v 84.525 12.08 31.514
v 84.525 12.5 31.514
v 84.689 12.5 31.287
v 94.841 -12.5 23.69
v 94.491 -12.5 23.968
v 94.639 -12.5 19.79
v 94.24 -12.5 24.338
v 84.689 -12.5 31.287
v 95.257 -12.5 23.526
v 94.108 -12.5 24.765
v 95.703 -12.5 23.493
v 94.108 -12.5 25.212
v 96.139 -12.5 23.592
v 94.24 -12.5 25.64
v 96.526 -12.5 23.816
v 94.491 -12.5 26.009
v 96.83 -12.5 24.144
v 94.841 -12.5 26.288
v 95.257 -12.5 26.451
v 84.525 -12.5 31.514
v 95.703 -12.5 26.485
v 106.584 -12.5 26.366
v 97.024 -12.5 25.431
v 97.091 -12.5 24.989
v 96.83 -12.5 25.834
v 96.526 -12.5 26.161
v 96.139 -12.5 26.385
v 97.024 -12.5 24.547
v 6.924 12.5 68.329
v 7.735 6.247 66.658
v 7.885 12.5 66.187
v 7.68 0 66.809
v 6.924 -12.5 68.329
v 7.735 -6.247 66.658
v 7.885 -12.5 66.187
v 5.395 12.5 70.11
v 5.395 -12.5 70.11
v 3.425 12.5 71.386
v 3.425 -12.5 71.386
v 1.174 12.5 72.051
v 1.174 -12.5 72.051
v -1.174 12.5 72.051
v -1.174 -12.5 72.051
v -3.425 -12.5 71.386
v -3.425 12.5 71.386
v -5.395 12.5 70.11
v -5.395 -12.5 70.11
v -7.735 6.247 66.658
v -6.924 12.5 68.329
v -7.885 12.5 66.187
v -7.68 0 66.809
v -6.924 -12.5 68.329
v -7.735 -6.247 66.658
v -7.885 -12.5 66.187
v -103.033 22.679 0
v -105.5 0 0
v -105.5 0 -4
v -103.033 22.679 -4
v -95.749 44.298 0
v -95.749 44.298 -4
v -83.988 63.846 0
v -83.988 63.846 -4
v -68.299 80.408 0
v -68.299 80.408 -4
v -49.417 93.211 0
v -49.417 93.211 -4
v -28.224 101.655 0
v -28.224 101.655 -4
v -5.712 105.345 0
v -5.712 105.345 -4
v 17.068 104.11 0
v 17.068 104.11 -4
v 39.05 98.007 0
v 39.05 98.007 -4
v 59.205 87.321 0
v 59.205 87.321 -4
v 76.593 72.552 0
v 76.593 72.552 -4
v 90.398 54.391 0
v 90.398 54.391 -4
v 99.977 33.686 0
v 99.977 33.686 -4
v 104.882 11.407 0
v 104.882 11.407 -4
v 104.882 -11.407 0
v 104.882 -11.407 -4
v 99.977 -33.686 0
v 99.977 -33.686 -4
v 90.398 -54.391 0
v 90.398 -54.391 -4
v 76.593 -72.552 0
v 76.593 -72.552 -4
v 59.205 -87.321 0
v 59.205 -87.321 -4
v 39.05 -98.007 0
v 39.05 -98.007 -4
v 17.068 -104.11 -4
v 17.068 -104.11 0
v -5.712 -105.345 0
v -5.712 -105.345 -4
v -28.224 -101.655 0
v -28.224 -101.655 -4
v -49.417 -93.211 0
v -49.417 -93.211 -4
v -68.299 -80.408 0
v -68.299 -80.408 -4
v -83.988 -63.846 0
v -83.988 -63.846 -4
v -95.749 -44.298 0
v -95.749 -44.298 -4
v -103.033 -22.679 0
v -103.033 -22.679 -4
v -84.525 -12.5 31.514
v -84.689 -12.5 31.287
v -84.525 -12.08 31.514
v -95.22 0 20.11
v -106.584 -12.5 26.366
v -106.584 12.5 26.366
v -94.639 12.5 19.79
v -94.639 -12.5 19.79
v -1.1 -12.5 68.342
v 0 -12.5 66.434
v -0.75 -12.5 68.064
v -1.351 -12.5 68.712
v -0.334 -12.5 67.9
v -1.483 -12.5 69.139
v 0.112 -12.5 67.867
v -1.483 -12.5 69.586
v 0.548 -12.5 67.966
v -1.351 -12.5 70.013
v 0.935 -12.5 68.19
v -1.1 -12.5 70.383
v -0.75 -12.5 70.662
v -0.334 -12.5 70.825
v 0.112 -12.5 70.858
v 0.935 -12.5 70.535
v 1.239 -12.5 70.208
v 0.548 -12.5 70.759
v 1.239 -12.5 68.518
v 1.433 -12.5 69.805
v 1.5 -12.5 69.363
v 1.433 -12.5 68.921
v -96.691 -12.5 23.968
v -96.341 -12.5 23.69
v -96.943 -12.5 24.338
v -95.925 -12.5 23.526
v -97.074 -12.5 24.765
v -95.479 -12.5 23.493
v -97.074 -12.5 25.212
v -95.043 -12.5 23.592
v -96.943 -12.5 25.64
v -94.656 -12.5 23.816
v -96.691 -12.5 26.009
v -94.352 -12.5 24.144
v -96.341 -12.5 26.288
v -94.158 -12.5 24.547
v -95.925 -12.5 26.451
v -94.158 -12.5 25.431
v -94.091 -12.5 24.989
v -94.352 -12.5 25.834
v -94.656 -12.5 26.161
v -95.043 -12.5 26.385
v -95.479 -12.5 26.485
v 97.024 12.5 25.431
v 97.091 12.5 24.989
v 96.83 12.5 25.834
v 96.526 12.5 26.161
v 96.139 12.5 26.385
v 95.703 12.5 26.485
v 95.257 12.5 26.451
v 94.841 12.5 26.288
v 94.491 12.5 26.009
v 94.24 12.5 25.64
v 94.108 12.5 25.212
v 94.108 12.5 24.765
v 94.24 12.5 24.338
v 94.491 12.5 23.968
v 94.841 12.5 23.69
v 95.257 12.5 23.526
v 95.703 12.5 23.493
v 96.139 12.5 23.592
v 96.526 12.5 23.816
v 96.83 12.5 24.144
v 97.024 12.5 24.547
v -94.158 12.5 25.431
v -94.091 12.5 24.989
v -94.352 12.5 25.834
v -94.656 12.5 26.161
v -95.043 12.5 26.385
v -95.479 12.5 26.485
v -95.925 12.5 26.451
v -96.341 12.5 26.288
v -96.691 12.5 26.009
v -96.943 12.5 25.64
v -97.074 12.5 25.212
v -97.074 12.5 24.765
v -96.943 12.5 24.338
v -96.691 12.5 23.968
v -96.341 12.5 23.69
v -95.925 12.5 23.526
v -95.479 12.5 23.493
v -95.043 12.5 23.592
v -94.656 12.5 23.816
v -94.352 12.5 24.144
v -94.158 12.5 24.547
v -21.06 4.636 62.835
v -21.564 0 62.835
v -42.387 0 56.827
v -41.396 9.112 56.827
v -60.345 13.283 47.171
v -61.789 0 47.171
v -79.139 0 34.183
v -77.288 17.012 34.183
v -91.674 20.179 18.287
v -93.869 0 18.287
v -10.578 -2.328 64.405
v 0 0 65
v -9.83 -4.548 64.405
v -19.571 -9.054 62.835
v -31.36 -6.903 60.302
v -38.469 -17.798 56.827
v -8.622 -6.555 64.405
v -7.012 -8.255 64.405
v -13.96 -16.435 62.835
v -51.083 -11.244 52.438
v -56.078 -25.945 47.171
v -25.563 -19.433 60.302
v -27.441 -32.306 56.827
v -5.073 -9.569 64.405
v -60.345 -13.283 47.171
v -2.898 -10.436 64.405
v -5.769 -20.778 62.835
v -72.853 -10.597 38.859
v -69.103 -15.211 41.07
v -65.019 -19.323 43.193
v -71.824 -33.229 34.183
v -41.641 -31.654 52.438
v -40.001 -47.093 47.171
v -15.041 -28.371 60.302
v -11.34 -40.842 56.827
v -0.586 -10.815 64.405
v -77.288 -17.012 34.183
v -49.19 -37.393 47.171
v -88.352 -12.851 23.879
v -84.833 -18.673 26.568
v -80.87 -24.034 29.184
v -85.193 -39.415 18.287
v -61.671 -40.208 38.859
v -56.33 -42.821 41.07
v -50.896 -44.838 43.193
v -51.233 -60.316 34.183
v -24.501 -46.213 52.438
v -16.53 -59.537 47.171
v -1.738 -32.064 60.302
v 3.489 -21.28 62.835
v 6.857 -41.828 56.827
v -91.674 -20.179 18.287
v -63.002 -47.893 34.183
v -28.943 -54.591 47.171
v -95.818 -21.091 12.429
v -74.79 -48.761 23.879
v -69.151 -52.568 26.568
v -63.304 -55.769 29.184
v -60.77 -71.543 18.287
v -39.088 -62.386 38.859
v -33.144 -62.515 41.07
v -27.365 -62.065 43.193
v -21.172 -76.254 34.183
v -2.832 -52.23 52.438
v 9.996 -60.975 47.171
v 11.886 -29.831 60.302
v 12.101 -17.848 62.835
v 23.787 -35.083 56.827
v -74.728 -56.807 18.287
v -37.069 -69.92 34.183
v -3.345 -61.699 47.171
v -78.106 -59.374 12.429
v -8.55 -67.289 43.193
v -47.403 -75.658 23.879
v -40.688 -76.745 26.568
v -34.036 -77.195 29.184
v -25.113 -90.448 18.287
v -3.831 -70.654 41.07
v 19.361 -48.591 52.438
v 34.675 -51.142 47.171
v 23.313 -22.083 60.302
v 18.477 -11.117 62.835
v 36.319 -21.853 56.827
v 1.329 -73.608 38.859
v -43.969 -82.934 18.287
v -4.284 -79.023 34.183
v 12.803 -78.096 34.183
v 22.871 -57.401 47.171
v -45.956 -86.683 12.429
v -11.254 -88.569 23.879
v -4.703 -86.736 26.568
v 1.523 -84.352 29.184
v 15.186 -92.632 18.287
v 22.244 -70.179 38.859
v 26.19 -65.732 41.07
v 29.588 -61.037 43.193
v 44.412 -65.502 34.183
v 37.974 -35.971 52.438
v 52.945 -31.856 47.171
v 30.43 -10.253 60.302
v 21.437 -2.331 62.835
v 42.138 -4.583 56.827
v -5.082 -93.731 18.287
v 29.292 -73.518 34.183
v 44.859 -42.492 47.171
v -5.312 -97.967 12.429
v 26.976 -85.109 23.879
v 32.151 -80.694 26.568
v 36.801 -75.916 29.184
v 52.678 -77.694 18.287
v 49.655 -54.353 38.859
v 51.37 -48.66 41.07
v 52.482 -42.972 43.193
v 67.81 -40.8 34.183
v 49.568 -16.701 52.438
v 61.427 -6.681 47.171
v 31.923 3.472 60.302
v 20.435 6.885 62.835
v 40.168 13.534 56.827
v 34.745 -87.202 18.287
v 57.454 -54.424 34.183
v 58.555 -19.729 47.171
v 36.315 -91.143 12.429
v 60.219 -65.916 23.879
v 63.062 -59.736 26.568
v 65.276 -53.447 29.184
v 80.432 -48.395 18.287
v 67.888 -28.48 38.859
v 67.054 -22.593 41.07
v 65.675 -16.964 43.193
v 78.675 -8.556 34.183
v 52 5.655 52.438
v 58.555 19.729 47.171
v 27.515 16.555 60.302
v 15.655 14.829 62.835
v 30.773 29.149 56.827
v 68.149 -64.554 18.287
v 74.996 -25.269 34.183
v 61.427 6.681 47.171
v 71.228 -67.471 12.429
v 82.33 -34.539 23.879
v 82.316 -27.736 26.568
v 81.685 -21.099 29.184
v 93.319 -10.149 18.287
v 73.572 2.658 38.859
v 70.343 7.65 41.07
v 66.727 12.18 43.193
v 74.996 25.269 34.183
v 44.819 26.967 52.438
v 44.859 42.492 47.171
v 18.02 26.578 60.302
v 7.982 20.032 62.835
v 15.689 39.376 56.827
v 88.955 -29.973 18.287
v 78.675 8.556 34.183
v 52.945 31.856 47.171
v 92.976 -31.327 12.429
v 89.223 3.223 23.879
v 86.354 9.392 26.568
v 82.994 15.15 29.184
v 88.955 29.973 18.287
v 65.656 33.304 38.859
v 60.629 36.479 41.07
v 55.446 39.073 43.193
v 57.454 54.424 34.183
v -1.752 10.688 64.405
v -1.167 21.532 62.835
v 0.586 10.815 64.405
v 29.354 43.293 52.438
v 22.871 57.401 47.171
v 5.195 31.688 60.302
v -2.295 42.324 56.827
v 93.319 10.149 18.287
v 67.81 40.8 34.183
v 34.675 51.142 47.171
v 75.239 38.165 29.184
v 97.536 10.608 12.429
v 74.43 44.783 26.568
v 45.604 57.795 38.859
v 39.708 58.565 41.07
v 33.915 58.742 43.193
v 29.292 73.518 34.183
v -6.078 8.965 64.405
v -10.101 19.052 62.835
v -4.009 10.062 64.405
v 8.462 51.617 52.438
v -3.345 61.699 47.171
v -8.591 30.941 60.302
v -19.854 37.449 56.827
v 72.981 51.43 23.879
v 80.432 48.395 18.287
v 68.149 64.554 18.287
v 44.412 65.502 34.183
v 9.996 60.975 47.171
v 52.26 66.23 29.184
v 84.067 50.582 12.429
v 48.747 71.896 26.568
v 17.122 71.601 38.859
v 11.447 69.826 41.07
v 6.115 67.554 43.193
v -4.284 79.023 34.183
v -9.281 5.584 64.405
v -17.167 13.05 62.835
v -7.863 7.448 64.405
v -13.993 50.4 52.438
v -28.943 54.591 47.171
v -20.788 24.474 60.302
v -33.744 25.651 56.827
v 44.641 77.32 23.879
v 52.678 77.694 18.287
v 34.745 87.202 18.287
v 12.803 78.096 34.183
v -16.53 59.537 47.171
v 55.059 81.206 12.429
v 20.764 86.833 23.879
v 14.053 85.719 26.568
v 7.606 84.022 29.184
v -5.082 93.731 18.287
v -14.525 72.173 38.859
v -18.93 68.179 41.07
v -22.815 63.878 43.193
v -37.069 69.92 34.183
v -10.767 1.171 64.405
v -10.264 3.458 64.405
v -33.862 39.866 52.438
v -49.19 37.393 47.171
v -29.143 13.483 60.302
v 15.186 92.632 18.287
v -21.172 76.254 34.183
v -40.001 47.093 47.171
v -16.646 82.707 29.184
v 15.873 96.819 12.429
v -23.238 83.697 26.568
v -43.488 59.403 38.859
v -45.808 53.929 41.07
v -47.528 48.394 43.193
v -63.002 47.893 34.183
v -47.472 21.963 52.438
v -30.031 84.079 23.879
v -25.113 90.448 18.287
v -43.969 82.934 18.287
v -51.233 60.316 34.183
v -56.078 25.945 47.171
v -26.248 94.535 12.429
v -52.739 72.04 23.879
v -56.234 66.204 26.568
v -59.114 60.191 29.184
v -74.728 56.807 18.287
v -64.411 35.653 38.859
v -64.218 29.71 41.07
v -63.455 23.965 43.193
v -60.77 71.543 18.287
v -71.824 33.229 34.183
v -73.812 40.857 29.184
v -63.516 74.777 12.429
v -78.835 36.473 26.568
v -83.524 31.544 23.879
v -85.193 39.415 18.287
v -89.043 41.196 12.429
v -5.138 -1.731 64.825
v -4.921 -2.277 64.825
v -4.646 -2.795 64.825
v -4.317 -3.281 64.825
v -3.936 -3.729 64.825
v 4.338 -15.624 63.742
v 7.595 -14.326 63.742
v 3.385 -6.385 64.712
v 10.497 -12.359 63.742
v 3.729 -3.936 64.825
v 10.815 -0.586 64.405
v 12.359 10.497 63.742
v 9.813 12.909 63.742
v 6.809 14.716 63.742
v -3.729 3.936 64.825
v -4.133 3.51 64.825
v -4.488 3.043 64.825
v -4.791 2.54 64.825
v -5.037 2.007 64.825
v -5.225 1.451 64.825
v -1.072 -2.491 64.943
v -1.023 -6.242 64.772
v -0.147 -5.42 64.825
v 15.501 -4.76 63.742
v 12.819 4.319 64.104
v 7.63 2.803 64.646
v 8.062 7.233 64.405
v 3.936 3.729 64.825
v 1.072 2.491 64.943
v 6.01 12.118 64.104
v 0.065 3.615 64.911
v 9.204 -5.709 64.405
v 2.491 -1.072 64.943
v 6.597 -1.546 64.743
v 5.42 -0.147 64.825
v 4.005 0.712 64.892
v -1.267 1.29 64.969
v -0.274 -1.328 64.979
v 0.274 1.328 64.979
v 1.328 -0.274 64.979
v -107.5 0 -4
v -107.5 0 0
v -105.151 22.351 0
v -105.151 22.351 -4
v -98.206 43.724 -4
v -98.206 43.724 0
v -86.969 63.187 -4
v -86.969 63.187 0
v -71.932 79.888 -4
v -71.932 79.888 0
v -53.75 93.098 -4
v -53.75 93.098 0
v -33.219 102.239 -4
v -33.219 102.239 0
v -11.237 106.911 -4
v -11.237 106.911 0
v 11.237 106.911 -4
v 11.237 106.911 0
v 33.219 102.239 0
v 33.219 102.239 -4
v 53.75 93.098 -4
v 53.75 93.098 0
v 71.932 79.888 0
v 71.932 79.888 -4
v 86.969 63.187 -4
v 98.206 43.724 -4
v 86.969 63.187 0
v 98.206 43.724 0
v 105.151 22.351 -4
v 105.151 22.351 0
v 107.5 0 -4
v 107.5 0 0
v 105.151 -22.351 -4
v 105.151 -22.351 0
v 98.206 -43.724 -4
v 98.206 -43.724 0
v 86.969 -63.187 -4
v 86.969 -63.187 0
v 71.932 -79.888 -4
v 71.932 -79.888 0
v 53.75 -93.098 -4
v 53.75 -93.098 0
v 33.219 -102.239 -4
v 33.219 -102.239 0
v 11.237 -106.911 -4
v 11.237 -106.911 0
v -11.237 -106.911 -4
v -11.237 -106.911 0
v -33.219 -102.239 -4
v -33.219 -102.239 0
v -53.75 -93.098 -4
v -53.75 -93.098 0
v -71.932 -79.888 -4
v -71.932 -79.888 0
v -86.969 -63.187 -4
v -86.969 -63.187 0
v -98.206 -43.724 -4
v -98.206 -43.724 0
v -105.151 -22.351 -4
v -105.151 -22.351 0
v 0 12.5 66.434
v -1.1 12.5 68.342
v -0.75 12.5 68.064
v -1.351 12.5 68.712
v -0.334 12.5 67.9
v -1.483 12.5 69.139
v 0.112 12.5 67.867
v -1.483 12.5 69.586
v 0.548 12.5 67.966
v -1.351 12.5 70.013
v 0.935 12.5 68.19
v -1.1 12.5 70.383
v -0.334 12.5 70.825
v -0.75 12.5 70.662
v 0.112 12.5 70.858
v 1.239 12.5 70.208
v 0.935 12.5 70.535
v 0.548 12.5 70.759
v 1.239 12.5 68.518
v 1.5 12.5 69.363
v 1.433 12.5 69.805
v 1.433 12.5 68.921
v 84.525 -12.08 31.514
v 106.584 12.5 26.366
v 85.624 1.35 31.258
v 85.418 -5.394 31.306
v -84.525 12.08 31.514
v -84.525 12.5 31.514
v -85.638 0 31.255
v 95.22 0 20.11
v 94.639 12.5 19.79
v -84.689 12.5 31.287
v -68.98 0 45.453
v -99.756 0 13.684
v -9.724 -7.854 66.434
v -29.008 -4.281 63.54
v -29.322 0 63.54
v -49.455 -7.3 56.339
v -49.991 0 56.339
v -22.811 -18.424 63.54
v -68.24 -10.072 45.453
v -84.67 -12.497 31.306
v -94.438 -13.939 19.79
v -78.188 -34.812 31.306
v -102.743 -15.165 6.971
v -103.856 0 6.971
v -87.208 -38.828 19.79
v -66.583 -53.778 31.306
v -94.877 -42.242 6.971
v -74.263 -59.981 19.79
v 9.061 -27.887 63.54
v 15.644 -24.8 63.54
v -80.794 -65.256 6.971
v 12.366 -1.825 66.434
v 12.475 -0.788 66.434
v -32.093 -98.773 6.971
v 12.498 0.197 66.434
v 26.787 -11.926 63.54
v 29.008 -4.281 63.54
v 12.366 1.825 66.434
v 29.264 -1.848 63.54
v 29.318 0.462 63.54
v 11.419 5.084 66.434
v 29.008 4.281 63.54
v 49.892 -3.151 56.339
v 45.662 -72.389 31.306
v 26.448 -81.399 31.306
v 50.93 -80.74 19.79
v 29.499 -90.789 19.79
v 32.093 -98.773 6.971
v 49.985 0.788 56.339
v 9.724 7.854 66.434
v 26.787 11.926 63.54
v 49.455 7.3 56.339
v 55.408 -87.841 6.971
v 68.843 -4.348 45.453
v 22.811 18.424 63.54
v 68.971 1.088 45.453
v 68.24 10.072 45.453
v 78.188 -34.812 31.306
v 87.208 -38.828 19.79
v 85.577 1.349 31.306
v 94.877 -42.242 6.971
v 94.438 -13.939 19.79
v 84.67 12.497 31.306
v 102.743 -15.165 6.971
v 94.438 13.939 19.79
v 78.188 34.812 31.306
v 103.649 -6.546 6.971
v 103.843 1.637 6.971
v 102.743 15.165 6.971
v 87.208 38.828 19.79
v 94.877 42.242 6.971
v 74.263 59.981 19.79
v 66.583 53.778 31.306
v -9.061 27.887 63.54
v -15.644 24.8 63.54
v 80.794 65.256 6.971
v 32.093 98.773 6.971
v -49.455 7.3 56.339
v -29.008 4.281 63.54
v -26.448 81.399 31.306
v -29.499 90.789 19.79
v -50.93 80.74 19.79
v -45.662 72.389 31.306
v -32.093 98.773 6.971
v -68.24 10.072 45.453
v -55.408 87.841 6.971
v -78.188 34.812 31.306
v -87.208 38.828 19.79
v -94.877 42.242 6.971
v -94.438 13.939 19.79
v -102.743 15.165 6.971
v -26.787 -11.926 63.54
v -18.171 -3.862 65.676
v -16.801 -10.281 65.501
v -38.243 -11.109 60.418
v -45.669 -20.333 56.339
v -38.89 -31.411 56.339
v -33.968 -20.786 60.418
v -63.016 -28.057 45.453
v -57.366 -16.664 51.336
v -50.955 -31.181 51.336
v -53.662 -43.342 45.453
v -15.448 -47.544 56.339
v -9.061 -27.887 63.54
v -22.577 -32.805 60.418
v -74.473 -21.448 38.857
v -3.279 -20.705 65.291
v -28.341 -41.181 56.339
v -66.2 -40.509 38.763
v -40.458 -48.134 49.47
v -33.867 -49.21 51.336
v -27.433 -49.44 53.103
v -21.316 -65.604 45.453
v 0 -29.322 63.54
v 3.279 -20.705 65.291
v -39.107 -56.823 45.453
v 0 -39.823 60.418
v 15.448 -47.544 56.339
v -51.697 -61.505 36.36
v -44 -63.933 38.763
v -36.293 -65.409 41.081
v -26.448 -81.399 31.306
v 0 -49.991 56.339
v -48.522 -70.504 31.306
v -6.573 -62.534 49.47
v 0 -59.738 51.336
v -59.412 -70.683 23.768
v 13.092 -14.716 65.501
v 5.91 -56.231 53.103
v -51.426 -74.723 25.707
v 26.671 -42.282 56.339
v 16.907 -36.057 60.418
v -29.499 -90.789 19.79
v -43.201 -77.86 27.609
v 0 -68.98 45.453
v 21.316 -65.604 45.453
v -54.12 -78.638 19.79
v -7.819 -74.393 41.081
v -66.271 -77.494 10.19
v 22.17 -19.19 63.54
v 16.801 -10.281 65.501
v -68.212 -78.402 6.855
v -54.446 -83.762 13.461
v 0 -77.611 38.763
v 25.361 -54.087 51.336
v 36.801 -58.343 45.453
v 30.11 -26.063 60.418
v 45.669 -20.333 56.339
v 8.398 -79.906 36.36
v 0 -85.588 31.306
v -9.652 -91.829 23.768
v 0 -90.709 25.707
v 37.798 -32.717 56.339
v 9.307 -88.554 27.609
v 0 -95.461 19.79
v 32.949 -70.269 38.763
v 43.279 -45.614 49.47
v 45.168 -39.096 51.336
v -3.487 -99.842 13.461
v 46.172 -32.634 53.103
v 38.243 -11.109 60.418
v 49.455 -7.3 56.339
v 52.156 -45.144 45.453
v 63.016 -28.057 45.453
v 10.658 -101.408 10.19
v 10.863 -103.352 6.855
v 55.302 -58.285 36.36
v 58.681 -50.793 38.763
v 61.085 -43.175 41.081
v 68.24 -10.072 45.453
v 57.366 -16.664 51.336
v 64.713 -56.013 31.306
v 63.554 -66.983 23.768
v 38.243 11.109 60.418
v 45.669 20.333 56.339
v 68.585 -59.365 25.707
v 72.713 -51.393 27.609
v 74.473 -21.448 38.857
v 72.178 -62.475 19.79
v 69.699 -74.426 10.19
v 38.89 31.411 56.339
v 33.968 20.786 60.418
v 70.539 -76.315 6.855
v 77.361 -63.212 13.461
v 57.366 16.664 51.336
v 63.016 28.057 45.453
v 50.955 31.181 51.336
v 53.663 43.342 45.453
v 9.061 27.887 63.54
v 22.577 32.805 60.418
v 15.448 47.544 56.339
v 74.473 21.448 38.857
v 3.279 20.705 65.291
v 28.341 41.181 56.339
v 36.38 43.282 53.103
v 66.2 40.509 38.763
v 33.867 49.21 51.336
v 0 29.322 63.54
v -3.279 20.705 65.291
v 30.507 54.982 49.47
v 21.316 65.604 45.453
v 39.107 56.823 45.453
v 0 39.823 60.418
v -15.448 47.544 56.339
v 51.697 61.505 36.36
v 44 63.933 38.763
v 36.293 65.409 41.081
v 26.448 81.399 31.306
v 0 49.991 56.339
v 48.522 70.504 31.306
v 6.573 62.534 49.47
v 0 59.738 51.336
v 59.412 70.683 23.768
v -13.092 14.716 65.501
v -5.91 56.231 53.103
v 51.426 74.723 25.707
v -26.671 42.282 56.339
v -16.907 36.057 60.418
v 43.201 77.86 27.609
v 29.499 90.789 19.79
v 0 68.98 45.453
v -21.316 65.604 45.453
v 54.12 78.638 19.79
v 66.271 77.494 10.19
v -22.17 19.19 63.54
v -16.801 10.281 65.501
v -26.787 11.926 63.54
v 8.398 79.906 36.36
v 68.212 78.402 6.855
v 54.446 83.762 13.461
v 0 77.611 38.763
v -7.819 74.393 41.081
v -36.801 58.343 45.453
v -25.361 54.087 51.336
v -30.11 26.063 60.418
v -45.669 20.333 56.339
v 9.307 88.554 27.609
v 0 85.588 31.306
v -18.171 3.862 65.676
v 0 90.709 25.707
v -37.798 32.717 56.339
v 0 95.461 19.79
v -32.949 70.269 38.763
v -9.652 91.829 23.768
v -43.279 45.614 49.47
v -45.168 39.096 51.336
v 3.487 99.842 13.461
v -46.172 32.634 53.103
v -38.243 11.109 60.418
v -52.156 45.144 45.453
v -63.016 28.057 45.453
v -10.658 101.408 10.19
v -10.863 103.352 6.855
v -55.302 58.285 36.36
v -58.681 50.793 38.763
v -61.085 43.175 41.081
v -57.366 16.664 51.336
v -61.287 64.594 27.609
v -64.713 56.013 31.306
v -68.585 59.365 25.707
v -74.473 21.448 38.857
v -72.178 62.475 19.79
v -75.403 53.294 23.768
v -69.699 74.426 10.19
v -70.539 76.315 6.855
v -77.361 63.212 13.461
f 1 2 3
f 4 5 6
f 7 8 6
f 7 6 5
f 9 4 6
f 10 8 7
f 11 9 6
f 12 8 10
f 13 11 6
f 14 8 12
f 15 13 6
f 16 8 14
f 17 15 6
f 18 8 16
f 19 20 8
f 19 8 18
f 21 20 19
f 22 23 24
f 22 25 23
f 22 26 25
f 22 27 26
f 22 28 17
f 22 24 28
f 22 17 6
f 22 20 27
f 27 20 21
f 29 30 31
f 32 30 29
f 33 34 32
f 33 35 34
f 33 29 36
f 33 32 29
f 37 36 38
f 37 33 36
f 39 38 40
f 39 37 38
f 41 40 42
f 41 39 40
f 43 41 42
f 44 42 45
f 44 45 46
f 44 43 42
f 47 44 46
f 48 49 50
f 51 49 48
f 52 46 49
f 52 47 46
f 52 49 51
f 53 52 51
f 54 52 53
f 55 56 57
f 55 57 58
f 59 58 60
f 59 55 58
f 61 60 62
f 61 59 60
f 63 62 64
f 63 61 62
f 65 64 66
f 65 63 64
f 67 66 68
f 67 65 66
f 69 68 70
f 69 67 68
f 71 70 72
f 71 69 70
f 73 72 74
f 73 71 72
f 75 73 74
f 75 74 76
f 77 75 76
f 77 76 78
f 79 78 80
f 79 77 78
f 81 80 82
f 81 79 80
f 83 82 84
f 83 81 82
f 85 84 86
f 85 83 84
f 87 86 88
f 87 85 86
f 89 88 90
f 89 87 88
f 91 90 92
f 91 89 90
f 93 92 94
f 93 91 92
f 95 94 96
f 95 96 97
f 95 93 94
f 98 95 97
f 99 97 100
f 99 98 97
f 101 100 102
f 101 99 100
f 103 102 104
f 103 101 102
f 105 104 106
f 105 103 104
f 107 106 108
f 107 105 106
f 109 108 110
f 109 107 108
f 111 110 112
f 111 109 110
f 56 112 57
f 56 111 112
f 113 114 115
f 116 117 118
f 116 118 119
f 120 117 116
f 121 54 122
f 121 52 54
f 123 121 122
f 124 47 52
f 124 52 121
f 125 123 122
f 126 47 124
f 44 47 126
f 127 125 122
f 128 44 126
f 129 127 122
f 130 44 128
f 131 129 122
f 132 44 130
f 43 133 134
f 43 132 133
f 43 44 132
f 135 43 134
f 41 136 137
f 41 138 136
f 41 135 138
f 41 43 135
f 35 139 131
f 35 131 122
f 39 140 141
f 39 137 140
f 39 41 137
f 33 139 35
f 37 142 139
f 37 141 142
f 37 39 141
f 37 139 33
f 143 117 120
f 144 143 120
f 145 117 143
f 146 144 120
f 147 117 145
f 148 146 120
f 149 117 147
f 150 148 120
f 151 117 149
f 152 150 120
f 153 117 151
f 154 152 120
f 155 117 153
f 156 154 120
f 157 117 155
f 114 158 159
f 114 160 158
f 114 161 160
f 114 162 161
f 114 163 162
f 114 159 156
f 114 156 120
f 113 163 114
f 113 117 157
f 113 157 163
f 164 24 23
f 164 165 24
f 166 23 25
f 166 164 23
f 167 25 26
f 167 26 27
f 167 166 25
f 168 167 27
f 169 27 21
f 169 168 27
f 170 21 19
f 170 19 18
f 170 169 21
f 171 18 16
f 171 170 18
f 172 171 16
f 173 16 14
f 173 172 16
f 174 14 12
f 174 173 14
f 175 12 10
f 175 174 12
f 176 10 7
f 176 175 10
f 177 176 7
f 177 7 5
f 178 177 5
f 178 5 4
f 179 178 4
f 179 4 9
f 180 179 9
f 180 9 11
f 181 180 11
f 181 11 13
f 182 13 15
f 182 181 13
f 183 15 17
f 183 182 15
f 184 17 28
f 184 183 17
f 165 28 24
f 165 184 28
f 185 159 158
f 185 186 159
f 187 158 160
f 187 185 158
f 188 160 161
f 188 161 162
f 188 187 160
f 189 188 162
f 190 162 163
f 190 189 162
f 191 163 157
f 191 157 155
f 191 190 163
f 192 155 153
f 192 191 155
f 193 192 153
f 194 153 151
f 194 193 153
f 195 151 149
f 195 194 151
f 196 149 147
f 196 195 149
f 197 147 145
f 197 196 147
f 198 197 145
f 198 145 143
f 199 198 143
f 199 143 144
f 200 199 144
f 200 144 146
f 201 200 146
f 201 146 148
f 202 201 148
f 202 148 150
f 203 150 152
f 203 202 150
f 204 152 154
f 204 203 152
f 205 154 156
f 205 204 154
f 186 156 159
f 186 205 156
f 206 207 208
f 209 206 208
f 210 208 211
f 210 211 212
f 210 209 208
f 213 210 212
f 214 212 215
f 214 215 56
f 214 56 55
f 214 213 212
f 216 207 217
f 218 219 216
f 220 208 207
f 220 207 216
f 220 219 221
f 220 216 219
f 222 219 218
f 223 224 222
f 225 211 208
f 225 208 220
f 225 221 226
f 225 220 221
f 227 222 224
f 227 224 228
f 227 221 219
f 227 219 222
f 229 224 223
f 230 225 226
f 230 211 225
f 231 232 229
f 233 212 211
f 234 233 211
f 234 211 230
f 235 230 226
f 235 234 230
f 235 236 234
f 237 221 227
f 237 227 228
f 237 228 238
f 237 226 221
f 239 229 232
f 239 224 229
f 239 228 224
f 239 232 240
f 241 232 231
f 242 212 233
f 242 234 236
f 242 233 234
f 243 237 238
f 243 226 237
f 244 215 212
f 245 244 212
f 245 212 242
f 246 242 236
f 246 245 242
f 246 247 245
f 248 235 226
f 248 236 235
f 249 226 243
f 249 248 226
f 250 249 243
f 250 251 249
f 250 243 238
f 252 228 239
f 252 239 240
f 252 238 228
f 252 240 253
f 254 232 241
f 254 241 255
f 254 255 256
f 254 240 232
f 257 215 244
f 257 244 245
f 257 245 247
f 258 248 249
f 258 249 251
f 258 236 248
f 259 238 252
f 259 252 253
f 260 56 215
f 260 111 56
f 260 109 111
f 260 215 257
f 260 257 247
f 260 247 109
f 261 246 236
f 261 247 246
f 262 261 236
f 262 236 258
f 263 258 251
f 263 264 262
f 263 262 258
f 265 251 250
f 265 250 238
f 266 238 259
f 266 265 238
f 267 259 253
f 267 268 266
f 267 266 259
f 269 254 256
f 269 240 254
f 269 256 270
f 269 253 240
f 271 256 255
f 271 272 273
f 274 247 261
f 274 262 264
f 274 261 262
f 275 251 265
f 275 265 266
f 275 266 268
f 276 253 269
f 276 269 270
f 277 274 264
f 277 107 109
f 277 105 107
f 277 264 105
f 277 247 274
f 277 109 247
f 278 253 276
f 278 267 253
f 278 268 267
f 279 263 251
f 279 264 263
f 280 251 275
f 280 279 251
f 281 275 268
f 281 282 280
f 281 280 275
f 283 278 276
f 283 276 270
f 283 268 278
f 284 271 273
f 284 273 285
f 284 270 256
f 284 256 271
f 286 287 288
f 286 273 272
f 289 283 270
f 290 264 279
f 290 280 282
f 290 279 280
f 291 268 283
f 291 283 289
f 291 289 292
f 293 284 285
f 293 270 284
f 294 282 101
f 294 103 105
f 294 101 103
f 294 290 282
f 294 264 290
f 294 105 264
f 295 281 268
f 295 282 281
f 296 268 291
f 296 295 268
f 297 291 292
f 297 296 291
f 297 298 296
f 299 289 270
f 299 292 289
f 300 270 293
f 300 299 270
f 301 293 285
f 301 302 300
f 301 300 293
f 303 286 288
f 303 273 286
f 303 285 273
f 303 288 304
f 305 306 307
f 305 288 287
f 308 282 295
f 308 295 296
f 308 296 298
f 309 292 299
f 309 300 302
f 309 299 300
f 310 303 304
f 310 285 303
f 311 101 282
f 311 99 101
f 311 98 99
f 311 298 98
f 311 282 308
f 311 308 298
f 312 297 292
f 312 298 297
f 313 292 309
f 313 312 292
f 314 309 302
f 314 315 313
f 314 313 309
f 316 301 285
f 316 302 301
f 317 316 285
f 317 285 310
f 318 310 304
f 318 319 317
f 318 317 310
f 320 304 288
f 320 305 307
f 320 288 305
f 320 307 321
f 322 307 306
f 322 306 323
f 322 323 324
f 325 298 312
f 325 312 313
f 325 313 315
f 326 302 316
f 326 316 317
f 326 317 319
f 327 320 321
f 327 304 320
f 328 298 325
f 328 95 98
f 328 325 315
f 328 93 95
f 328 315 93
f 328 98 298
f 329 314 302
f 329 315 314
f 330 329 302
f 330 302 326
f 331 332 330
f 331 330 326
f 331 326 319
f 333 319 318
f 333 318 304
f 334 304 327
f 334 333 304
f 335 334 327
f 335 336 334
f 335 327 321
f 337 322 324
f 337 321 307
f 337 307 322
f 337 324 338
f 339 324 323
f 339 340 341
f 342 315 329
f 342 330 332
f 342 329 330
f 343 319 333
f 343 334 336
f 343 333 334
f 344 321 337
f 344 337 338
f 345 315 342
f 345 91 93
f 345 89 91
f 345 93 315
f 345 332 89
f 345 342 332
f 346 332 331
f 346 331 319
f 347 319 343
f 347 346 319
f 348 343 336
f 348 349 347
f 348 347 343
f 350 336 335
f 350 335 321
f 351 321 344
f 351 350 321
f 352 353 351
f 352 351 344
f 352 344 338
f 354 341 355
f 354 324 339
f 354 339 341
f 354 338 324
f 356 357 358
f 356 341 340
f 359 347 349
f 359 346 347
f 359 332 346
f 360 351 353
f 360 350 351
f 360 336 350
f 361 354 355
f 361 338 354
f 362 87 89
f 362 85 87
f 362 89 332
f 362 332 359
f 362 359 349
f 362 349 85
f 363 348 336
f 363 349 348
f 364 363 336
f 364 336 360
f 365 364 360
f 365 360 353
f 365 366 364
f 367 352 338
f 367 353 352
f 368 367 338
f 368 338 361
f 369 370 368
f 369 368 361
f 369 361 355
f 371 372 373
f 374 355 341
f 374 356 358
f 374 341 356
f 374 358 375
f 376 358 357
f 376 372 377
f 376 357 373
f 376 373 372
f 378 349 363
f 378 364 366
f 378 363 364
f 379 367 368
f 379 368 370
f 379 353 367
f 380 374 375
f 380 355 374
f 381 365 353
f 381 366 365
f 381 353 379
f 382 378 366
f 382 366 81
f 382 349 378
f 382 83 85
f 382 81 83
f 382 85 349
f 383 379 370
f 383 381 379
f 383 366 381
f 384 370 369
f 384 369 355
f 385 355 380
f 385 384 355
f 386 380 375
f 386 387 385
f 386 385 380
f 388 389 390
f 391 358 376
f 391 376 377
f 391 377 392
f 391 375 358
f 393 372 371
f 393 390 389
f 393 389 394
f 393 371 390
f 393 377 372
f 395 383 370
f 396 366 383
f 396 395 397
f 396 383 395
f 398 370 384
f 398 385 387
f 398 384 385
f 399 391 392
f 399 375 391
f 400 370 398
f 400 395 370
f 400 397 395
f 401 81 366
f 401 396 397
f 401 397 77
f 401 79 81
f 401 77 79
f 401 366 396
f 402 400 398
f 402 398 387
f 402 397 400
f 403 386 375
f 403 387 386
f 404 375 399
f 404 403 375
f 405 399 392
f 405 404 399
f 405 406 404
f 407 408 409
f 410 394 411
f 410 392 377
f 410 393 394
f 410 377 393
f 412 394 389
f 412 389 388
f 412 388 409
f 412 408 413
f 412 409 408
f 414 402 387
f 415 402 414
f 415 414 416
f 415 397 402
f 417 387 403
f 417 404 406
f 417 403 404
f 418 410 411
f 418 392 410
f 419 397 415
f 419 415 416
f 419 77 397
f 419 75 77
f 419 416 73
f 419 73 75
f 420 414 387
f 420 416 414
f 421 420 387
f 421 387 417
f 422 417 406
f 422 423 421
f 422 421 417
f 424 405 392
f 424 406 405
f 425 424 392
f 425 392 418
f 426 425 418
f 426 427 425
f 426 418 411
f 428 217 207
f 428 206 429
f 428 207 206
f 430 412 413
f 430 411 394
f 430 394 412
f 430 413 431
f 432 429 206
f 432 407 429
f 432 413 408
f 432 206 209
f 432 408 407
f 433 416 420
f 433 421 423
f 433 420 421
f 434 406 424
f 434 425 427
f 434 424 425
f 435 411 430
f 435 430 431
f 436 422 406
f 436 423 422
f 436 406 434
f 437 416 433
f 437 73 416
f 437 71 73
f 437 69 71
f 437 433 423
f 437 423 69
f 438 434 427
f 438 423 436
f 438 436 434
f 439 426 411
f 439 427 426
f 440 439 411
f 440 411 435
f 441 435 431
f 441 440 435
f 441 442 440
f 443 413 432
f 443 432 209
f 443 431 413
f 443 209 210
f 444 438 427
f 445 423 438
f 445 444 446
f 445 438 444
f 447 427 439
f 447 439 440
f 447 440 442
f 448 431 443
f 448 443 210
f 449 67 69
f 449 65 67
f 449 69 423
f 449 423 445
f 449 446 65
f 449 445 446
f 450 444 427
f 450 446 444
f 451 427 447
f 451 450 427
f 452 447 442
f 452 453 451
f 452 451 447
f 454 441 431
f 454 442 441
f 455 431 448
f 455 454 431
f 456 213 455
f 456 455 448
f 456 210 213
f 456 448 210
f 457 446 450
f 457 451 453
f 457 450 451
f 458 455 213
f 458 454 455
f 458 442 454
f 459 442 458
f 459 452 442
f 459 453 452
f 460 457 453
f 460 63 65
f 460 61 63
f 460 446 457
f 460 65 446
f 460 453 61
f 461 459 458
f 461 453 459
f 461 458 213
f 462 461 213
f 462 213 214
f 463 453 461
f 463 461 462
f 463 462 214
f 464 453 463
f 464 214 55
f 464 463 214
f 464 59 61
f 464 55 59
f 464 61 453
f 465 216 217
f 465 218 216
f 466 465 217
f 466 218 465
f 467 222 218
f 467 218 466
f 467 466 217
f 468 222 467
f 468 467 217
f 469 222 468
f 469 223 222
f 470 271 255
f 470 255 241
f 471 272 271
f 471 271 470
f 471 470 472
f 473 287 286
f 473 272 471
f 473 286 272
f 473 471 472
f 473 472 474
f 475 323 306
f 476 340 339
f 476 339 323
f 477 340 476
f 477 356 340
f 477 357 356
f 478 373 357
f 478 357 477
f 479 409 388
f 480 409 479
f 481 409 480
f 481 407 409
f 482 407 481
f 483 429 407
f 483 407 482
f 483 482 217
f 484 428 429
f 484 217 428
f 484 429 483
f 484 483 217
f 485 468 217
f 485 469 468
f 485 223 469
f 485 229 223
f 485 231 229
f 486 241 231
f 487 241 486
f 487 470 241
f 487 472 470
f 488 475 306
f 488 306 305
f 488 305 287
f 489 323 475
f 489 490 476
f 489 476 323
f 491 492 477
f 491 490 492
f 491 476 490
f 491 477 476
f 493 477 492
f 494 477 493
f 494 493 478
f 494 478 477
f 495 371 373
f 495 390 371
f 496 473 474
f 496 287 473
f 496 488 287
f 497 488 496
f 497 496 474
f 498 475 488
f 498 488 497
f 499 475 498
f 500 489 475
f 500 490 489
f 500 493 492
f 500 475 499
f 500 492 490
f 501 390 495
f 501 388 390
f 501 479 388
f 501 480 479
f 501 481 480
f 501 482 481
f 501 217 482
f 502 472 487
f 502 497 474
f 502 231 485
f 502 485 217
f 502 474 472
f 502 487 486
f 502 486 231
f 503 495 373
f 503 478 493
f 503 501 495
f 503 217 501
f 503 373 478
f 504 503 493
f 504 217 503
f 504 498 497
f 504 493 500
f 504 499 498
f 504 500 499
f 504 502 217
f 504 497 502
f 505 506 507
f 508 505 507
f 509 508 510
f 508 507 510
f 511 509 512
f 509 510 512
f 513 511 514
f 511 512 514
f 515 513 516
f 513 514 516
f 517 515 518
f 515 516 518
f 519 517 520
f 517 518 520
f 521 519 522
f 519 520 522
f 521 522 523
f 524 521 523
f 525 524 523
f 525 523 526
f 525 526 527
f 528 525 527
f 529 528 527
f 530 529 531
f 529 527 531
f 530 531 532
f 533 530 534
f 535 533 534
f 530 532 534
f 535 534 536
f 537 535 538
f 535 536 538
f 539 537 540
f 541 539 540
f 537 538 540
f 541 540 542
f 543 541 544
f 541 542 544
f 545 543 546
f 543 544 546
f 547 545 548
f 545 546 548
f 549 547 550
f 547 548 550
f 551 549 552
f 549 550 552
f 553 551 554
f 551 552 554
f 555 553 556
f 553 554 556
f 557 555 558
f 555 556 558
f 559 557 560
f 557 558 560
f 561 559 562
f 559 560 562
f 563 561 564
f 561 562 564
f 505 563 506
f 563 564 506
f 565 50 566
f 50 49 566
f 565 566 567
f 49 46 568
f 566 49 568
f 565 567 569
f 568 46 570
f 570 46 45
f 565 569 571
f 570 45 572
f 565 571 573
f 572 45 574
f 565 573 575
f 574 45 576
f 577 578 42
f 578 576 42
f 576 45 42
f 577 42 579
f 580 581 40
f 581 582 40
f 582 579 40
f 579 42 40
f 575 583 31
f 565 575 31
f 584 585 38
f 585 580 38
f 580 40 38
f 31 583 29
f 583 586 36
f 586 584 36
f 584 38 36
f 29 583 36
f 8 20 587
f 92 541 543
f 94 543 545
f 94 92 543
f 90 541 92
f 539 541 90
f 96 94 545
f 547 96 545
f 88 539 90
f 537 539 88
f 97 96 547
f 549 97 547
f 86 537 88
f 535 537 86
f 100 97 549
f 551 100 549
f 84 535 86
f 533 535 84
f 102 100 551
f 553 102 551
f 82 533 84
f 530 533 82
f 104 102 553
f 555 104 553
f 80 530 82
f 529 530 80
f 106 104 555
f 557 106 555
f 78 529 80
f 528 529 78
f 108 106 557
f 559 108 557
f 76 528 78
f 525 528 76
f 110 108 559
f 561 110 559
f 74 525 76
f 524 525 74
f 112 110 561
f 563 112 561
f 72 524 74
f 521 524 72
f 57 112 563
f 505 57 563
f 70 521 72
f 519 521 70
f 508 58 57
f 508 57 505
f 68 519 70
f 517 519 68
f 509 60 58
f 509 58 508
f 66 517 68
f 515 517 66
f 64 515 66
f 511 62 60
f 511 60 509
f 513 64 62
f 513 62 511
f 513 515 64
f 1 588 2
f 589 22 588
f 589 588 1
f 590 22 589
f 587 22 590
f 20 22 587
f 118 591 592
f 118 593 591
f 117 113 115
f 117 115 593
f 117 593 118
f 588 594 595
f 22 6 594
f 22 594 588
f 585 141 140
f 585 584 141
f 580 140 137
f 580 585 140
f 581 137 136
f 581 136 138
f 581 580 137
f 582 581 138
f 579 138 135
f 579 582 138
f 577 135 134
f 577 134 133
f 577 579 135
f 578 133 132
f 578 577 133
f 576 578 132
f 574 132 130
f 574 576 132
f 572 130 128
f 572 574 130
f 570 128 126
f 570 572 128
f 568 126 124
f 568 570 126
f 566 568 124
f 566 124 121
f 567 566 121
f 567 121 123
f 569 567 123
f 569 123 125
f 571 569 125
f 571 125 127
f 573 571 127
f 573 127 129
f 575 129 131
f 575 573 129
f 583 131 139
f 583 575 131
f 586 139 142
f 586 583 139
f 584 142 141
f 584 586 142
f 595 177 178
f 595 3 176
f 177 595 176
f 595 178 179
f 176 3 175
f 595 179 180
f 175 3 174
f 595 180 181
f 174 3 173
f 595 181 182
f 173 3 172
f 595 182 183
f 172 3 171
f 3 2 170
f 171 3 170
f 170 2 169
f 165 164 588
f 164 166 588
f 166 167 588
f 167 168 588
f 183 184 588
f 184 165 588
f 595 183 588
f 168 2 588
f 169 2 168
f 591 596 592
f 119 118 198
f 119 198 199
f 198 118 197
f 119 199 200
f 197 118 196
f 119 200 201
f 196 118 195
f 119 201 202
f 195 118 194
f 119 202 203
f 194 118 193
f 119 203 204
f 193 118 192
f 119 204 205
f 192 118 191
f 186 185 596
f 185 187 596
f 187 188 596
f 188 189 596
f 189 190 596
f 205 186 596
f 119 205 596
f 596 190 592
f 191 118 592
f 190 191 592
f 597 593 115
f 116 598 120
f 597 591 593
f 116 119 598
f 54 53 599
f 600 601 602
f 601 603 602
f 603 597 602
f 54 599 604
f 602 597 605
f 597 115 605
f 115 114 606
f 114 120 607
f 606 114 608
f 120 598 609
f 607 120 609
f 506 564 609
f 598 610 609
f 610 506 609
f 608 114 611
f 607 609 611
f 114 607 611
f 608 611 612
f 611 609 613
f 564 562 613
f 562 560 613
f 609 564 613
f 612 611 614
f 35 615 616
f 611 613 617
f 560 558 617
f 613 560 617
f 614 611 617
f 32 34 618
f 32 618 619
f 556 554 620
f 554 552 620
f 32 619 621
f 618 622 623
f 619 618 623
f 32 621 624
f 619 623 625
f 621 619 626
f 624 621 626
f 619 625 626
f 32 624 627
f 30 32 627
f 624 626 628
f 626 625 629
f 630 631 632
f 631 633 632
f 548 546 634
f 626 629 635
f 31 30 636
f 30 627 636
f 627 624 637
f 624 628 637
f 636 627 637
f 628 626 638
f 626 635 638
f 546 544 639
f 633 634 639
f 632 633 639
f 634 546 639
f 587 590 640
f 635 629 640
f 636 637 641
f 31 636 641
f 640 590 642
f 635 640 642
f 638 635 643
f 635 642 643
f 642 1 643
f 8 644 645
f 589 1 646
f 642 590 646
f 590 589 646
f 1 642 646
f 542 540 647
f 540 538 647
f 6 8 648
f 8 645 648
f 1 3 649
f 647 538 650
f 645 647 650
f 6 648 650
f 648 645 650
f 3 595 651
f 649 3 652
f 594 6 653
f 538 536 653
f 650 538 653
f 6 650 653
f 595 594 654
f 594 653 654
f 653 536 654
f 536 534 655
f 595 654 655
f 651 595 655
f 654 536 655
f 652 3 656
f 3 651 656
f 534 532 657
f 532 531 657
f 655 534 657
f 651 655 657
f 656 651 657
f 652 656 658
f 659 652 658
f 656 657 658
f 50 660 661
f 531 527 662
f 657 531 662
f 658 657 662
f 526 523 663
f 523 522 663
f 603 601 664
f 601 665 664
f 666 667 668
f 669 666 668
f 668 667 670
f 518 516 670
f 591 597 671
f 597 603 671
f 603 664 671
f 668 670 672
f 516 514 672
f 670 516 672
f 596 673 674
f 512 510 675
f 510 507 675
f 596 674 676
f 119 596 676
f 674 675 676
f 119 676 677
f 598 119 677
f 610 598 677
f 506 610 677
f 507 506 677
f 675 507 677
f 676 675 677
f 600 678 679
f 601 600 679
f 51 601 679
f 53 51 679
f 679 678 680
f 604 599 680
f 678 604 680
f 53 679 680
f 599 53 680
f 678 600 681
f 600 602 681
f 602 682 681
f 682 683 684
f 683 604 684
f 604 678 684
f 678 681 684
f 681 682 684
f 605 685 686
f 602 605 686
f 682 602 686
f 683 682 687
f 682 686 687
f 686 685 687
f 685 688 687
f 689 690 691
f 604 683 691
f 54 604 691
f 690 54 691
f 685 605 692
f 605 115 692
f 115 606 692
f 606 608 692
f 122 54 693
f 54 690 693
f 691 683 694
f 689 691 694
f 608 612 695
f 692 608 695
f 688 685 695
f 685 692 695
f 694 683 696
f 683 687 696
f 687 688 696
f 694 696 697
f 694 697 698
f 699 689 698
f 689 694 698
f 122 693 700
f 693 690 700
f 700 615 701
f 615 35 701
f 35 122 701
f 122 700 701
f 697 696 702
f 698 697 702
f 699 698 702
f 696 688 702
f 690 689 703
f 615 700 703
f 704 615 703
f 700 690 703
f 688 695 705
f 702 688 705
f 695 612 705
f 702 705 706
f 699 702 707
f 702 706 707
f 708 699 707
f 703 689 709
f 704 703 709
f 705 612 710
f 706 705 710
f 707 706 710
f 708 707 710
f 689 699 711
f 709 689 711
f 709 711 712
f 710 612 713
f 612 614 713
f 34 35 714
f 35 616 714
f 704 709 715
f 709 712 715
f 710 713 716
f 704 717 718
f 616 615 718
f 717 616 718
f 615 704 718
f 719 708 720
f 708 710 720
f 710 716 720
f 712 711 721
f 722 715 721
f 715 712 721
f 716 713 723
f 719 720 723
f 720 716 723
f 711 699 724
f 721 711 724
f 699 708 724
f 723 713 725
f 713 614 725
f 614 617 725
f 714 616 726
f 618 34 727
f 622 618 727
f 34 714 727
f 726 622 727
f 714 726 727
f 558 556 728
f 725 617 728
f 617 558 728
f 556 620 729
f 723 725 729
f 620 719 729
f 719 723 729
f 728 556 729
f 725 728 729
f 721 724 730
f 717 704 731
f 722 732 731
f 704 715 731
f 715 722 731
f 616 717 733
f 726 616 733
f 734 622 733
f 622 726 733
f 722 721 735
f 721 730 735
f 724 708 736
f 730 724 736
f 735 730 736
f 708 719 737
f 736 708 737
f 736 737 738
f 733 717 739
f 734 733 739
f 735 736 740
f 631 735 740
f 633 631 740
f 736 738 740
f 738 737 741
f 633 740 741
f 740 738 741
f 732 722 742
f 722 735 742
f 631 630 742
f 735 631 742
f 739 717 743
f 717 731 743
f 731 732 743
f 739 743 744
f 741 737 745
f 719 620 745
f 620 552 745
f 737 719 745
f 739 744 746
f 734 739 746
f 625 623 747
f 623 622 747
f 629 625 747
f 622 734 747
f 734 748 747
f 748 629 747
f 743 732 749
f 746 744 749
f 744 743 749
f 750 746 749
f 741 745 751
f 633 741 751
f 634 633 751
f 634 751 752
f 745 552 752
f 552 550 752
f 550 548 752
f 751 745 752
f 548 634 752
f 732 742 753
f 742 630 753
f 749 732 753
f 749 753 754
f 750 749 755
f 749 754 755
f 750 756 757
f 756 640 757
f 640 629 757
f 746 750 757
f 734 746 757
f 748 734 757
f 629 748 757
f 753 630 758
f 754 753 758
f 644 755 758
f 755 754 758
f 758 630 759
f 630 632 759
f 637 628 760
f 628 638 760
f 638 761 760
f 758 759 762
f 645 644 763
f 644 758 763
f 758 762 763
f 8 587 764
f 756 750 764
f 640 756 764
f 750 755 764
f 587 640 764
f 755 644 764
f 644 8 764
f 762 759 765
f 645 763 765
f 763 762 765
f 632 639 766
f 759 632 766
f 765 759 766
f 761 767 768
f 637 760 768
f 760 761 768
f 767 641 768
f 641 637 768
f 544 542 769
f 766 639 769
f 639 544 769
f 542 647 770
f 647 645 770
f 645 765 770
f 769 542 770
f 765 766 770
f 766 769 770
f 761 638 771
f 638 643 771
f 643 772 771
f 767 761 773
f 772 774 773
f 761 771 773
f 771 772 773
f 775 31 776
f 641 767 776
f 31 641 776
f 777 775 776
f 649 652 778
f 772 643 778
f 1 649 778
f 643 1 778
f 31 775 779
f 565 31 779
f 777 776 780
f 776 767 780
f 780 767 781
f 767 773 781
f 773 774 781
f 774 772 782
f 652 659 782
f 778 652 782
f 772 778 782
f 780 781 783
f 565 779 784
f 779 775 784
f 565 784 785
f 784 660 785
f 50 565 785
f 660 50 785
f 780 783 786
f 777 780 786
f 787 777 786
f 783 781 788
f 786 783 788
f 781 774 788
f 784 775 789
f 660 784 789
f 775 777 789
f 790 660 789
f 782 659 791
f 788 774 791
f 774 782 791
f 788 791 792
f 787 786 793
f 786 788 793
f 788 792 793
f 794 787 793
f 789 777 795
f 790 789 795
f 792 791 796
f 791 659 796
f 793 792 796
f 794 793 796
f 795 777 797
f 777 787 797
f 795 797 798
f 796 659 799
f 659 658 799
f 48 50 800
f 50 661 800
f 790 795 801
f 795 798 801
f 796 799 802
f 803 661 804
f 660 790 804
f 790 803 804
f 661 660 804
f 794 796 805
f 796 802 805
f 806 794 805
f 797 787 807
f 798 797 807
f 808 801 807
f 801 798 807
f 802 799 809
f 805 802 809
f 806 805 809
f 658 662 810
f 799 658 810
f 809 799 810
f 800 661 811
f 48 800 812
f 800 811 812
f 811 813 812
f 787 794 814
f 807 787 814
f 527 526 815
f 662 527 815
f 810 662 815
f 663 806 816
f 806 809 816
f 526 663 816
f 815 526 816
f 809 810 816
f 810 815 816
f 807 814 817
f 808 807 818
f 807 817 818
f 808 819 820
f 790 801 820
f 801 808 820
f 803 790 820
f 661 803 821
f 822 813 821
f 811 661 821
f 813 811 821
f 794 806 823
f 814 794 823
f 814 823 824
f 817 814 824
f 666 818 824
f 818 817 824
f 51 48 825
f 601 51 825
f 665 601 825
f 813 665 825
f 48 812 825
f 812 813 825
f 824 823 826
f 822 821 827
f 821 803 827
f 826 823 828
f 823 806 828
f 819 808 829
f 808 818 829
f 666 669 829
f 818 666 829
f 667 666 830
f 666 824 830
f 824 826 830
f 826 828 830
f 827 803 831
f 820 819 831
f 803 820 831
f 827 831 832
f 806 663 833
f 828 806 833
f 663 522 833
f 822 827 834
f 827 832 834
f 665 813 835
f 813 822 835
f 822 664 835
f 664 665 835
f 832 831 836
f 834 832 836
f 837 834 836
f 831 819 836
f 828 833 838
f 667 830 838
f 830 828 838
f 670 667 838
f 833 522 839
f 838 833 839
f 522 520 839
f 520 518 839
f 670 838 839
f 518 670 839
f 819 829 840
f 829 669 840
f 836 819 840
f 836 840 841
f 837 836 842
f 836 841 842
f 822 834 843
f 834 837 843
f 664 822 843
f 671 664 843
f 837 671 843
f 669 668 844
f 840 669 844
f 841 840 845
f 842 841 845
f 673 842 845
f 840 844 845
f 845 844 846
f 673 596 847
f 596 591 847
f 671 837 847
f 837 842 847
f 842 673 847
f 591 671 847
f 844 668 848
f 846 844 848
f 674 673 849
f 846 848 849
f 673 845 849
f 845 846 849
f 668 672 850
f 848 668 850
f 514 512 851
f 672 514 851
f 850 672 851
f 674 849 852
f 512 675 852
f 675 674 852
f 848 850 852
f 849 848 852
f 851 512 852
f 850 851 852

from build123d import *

# Parameters (mm, degrees)
F4_W      = 2
F4_H      = 4
F6_R      = 1.5
F7_DEPTH  = 12.5
F8_R      = 1.5
F9_DEPTH  = 12.5
F10_R     = 1.5
F11_DEPTH = 12.5


with BuildPart() as f2:
    # F0 (on Front) → F2 (revolve)
    with BuildSketch(Plane.XZ):
        with BuildLine():
            Line((-107.5, 0), (0, 0))
            Line((0, 0), (0, 67))
            ThreePointArc((0, 67), (-63.47382, 49.101651), (-107.5, 0))
        make_face()
    revolve(axis=Axis((0, 0, 33.5), (0, 0, 1)))

    # F1 (on Front) → F3 (revolve, cut)
    with BuildSketch(Plane.XZ):
        with BuildLine():
            Line((-105.5, 0), (0, 0))
            Line((0, 0), (0, 65))
            ThreePointArc((0, 65), (-61.789194, 47.171307), (-105.5, 0))
        make_face()
    revolve(axis=Axis((0, 0, 32.5), (0, 0, 1)), mode=Mode.SUBTRACT)

    # F4 (on Front) → F5 (revolve)
    with BuildSketch(Plane.XZ):
        with Locations((-106.5, -2)):
            Rectangle(F4_W, F4_H)
    revolve(axis=Axis((0, 0, -3.064933), (0, 0, -1)))

    # F6 (on Front) → F7 (join, symmetric)
    with BuildSketch(Plane.XZ):
        Polygon((-106.584328, 26.365628), (-93.438419, 19.129254), (-84.525248, 31.514426), align=None)
        with Locations((-95.591055, 24.988731)):
            Circle(F6_R, mode=Mode.SUBTRACT)
    extrude(amount=F7_DEPTH, both=True)

    # F8 (on Front) → F9 (join, symmetric)
    with BuildSketch(Plane.XZ):
        Polygon((84.52525, 31.514422), (93.43842, 19.12925), (106.584329, 26.365624), align=None)
        with Locations((95.591056, 24.988727)):
            Circle(F8_R, mode=Mode.SUBTRACT)
    extrude(amount=F9_DEPTH, both=True)

    # F10 (on Front) → F11 (join, symmetric)
    with BuildSketch(Plane.XZ):
        with BuildLine():
            ThreePointArc((8, 65.735355), (0, 72.135355), (-8, 65.735355))
            Line((-8, 65.735355), (8, 65.735355))
        make_face()
        with Locations((0, 69.362663)):
            Circle(F10_R, mode=Mode.SUBTRACT)
    extrude(amount=F11_DEPTH, both=True)


solid = f2.part
